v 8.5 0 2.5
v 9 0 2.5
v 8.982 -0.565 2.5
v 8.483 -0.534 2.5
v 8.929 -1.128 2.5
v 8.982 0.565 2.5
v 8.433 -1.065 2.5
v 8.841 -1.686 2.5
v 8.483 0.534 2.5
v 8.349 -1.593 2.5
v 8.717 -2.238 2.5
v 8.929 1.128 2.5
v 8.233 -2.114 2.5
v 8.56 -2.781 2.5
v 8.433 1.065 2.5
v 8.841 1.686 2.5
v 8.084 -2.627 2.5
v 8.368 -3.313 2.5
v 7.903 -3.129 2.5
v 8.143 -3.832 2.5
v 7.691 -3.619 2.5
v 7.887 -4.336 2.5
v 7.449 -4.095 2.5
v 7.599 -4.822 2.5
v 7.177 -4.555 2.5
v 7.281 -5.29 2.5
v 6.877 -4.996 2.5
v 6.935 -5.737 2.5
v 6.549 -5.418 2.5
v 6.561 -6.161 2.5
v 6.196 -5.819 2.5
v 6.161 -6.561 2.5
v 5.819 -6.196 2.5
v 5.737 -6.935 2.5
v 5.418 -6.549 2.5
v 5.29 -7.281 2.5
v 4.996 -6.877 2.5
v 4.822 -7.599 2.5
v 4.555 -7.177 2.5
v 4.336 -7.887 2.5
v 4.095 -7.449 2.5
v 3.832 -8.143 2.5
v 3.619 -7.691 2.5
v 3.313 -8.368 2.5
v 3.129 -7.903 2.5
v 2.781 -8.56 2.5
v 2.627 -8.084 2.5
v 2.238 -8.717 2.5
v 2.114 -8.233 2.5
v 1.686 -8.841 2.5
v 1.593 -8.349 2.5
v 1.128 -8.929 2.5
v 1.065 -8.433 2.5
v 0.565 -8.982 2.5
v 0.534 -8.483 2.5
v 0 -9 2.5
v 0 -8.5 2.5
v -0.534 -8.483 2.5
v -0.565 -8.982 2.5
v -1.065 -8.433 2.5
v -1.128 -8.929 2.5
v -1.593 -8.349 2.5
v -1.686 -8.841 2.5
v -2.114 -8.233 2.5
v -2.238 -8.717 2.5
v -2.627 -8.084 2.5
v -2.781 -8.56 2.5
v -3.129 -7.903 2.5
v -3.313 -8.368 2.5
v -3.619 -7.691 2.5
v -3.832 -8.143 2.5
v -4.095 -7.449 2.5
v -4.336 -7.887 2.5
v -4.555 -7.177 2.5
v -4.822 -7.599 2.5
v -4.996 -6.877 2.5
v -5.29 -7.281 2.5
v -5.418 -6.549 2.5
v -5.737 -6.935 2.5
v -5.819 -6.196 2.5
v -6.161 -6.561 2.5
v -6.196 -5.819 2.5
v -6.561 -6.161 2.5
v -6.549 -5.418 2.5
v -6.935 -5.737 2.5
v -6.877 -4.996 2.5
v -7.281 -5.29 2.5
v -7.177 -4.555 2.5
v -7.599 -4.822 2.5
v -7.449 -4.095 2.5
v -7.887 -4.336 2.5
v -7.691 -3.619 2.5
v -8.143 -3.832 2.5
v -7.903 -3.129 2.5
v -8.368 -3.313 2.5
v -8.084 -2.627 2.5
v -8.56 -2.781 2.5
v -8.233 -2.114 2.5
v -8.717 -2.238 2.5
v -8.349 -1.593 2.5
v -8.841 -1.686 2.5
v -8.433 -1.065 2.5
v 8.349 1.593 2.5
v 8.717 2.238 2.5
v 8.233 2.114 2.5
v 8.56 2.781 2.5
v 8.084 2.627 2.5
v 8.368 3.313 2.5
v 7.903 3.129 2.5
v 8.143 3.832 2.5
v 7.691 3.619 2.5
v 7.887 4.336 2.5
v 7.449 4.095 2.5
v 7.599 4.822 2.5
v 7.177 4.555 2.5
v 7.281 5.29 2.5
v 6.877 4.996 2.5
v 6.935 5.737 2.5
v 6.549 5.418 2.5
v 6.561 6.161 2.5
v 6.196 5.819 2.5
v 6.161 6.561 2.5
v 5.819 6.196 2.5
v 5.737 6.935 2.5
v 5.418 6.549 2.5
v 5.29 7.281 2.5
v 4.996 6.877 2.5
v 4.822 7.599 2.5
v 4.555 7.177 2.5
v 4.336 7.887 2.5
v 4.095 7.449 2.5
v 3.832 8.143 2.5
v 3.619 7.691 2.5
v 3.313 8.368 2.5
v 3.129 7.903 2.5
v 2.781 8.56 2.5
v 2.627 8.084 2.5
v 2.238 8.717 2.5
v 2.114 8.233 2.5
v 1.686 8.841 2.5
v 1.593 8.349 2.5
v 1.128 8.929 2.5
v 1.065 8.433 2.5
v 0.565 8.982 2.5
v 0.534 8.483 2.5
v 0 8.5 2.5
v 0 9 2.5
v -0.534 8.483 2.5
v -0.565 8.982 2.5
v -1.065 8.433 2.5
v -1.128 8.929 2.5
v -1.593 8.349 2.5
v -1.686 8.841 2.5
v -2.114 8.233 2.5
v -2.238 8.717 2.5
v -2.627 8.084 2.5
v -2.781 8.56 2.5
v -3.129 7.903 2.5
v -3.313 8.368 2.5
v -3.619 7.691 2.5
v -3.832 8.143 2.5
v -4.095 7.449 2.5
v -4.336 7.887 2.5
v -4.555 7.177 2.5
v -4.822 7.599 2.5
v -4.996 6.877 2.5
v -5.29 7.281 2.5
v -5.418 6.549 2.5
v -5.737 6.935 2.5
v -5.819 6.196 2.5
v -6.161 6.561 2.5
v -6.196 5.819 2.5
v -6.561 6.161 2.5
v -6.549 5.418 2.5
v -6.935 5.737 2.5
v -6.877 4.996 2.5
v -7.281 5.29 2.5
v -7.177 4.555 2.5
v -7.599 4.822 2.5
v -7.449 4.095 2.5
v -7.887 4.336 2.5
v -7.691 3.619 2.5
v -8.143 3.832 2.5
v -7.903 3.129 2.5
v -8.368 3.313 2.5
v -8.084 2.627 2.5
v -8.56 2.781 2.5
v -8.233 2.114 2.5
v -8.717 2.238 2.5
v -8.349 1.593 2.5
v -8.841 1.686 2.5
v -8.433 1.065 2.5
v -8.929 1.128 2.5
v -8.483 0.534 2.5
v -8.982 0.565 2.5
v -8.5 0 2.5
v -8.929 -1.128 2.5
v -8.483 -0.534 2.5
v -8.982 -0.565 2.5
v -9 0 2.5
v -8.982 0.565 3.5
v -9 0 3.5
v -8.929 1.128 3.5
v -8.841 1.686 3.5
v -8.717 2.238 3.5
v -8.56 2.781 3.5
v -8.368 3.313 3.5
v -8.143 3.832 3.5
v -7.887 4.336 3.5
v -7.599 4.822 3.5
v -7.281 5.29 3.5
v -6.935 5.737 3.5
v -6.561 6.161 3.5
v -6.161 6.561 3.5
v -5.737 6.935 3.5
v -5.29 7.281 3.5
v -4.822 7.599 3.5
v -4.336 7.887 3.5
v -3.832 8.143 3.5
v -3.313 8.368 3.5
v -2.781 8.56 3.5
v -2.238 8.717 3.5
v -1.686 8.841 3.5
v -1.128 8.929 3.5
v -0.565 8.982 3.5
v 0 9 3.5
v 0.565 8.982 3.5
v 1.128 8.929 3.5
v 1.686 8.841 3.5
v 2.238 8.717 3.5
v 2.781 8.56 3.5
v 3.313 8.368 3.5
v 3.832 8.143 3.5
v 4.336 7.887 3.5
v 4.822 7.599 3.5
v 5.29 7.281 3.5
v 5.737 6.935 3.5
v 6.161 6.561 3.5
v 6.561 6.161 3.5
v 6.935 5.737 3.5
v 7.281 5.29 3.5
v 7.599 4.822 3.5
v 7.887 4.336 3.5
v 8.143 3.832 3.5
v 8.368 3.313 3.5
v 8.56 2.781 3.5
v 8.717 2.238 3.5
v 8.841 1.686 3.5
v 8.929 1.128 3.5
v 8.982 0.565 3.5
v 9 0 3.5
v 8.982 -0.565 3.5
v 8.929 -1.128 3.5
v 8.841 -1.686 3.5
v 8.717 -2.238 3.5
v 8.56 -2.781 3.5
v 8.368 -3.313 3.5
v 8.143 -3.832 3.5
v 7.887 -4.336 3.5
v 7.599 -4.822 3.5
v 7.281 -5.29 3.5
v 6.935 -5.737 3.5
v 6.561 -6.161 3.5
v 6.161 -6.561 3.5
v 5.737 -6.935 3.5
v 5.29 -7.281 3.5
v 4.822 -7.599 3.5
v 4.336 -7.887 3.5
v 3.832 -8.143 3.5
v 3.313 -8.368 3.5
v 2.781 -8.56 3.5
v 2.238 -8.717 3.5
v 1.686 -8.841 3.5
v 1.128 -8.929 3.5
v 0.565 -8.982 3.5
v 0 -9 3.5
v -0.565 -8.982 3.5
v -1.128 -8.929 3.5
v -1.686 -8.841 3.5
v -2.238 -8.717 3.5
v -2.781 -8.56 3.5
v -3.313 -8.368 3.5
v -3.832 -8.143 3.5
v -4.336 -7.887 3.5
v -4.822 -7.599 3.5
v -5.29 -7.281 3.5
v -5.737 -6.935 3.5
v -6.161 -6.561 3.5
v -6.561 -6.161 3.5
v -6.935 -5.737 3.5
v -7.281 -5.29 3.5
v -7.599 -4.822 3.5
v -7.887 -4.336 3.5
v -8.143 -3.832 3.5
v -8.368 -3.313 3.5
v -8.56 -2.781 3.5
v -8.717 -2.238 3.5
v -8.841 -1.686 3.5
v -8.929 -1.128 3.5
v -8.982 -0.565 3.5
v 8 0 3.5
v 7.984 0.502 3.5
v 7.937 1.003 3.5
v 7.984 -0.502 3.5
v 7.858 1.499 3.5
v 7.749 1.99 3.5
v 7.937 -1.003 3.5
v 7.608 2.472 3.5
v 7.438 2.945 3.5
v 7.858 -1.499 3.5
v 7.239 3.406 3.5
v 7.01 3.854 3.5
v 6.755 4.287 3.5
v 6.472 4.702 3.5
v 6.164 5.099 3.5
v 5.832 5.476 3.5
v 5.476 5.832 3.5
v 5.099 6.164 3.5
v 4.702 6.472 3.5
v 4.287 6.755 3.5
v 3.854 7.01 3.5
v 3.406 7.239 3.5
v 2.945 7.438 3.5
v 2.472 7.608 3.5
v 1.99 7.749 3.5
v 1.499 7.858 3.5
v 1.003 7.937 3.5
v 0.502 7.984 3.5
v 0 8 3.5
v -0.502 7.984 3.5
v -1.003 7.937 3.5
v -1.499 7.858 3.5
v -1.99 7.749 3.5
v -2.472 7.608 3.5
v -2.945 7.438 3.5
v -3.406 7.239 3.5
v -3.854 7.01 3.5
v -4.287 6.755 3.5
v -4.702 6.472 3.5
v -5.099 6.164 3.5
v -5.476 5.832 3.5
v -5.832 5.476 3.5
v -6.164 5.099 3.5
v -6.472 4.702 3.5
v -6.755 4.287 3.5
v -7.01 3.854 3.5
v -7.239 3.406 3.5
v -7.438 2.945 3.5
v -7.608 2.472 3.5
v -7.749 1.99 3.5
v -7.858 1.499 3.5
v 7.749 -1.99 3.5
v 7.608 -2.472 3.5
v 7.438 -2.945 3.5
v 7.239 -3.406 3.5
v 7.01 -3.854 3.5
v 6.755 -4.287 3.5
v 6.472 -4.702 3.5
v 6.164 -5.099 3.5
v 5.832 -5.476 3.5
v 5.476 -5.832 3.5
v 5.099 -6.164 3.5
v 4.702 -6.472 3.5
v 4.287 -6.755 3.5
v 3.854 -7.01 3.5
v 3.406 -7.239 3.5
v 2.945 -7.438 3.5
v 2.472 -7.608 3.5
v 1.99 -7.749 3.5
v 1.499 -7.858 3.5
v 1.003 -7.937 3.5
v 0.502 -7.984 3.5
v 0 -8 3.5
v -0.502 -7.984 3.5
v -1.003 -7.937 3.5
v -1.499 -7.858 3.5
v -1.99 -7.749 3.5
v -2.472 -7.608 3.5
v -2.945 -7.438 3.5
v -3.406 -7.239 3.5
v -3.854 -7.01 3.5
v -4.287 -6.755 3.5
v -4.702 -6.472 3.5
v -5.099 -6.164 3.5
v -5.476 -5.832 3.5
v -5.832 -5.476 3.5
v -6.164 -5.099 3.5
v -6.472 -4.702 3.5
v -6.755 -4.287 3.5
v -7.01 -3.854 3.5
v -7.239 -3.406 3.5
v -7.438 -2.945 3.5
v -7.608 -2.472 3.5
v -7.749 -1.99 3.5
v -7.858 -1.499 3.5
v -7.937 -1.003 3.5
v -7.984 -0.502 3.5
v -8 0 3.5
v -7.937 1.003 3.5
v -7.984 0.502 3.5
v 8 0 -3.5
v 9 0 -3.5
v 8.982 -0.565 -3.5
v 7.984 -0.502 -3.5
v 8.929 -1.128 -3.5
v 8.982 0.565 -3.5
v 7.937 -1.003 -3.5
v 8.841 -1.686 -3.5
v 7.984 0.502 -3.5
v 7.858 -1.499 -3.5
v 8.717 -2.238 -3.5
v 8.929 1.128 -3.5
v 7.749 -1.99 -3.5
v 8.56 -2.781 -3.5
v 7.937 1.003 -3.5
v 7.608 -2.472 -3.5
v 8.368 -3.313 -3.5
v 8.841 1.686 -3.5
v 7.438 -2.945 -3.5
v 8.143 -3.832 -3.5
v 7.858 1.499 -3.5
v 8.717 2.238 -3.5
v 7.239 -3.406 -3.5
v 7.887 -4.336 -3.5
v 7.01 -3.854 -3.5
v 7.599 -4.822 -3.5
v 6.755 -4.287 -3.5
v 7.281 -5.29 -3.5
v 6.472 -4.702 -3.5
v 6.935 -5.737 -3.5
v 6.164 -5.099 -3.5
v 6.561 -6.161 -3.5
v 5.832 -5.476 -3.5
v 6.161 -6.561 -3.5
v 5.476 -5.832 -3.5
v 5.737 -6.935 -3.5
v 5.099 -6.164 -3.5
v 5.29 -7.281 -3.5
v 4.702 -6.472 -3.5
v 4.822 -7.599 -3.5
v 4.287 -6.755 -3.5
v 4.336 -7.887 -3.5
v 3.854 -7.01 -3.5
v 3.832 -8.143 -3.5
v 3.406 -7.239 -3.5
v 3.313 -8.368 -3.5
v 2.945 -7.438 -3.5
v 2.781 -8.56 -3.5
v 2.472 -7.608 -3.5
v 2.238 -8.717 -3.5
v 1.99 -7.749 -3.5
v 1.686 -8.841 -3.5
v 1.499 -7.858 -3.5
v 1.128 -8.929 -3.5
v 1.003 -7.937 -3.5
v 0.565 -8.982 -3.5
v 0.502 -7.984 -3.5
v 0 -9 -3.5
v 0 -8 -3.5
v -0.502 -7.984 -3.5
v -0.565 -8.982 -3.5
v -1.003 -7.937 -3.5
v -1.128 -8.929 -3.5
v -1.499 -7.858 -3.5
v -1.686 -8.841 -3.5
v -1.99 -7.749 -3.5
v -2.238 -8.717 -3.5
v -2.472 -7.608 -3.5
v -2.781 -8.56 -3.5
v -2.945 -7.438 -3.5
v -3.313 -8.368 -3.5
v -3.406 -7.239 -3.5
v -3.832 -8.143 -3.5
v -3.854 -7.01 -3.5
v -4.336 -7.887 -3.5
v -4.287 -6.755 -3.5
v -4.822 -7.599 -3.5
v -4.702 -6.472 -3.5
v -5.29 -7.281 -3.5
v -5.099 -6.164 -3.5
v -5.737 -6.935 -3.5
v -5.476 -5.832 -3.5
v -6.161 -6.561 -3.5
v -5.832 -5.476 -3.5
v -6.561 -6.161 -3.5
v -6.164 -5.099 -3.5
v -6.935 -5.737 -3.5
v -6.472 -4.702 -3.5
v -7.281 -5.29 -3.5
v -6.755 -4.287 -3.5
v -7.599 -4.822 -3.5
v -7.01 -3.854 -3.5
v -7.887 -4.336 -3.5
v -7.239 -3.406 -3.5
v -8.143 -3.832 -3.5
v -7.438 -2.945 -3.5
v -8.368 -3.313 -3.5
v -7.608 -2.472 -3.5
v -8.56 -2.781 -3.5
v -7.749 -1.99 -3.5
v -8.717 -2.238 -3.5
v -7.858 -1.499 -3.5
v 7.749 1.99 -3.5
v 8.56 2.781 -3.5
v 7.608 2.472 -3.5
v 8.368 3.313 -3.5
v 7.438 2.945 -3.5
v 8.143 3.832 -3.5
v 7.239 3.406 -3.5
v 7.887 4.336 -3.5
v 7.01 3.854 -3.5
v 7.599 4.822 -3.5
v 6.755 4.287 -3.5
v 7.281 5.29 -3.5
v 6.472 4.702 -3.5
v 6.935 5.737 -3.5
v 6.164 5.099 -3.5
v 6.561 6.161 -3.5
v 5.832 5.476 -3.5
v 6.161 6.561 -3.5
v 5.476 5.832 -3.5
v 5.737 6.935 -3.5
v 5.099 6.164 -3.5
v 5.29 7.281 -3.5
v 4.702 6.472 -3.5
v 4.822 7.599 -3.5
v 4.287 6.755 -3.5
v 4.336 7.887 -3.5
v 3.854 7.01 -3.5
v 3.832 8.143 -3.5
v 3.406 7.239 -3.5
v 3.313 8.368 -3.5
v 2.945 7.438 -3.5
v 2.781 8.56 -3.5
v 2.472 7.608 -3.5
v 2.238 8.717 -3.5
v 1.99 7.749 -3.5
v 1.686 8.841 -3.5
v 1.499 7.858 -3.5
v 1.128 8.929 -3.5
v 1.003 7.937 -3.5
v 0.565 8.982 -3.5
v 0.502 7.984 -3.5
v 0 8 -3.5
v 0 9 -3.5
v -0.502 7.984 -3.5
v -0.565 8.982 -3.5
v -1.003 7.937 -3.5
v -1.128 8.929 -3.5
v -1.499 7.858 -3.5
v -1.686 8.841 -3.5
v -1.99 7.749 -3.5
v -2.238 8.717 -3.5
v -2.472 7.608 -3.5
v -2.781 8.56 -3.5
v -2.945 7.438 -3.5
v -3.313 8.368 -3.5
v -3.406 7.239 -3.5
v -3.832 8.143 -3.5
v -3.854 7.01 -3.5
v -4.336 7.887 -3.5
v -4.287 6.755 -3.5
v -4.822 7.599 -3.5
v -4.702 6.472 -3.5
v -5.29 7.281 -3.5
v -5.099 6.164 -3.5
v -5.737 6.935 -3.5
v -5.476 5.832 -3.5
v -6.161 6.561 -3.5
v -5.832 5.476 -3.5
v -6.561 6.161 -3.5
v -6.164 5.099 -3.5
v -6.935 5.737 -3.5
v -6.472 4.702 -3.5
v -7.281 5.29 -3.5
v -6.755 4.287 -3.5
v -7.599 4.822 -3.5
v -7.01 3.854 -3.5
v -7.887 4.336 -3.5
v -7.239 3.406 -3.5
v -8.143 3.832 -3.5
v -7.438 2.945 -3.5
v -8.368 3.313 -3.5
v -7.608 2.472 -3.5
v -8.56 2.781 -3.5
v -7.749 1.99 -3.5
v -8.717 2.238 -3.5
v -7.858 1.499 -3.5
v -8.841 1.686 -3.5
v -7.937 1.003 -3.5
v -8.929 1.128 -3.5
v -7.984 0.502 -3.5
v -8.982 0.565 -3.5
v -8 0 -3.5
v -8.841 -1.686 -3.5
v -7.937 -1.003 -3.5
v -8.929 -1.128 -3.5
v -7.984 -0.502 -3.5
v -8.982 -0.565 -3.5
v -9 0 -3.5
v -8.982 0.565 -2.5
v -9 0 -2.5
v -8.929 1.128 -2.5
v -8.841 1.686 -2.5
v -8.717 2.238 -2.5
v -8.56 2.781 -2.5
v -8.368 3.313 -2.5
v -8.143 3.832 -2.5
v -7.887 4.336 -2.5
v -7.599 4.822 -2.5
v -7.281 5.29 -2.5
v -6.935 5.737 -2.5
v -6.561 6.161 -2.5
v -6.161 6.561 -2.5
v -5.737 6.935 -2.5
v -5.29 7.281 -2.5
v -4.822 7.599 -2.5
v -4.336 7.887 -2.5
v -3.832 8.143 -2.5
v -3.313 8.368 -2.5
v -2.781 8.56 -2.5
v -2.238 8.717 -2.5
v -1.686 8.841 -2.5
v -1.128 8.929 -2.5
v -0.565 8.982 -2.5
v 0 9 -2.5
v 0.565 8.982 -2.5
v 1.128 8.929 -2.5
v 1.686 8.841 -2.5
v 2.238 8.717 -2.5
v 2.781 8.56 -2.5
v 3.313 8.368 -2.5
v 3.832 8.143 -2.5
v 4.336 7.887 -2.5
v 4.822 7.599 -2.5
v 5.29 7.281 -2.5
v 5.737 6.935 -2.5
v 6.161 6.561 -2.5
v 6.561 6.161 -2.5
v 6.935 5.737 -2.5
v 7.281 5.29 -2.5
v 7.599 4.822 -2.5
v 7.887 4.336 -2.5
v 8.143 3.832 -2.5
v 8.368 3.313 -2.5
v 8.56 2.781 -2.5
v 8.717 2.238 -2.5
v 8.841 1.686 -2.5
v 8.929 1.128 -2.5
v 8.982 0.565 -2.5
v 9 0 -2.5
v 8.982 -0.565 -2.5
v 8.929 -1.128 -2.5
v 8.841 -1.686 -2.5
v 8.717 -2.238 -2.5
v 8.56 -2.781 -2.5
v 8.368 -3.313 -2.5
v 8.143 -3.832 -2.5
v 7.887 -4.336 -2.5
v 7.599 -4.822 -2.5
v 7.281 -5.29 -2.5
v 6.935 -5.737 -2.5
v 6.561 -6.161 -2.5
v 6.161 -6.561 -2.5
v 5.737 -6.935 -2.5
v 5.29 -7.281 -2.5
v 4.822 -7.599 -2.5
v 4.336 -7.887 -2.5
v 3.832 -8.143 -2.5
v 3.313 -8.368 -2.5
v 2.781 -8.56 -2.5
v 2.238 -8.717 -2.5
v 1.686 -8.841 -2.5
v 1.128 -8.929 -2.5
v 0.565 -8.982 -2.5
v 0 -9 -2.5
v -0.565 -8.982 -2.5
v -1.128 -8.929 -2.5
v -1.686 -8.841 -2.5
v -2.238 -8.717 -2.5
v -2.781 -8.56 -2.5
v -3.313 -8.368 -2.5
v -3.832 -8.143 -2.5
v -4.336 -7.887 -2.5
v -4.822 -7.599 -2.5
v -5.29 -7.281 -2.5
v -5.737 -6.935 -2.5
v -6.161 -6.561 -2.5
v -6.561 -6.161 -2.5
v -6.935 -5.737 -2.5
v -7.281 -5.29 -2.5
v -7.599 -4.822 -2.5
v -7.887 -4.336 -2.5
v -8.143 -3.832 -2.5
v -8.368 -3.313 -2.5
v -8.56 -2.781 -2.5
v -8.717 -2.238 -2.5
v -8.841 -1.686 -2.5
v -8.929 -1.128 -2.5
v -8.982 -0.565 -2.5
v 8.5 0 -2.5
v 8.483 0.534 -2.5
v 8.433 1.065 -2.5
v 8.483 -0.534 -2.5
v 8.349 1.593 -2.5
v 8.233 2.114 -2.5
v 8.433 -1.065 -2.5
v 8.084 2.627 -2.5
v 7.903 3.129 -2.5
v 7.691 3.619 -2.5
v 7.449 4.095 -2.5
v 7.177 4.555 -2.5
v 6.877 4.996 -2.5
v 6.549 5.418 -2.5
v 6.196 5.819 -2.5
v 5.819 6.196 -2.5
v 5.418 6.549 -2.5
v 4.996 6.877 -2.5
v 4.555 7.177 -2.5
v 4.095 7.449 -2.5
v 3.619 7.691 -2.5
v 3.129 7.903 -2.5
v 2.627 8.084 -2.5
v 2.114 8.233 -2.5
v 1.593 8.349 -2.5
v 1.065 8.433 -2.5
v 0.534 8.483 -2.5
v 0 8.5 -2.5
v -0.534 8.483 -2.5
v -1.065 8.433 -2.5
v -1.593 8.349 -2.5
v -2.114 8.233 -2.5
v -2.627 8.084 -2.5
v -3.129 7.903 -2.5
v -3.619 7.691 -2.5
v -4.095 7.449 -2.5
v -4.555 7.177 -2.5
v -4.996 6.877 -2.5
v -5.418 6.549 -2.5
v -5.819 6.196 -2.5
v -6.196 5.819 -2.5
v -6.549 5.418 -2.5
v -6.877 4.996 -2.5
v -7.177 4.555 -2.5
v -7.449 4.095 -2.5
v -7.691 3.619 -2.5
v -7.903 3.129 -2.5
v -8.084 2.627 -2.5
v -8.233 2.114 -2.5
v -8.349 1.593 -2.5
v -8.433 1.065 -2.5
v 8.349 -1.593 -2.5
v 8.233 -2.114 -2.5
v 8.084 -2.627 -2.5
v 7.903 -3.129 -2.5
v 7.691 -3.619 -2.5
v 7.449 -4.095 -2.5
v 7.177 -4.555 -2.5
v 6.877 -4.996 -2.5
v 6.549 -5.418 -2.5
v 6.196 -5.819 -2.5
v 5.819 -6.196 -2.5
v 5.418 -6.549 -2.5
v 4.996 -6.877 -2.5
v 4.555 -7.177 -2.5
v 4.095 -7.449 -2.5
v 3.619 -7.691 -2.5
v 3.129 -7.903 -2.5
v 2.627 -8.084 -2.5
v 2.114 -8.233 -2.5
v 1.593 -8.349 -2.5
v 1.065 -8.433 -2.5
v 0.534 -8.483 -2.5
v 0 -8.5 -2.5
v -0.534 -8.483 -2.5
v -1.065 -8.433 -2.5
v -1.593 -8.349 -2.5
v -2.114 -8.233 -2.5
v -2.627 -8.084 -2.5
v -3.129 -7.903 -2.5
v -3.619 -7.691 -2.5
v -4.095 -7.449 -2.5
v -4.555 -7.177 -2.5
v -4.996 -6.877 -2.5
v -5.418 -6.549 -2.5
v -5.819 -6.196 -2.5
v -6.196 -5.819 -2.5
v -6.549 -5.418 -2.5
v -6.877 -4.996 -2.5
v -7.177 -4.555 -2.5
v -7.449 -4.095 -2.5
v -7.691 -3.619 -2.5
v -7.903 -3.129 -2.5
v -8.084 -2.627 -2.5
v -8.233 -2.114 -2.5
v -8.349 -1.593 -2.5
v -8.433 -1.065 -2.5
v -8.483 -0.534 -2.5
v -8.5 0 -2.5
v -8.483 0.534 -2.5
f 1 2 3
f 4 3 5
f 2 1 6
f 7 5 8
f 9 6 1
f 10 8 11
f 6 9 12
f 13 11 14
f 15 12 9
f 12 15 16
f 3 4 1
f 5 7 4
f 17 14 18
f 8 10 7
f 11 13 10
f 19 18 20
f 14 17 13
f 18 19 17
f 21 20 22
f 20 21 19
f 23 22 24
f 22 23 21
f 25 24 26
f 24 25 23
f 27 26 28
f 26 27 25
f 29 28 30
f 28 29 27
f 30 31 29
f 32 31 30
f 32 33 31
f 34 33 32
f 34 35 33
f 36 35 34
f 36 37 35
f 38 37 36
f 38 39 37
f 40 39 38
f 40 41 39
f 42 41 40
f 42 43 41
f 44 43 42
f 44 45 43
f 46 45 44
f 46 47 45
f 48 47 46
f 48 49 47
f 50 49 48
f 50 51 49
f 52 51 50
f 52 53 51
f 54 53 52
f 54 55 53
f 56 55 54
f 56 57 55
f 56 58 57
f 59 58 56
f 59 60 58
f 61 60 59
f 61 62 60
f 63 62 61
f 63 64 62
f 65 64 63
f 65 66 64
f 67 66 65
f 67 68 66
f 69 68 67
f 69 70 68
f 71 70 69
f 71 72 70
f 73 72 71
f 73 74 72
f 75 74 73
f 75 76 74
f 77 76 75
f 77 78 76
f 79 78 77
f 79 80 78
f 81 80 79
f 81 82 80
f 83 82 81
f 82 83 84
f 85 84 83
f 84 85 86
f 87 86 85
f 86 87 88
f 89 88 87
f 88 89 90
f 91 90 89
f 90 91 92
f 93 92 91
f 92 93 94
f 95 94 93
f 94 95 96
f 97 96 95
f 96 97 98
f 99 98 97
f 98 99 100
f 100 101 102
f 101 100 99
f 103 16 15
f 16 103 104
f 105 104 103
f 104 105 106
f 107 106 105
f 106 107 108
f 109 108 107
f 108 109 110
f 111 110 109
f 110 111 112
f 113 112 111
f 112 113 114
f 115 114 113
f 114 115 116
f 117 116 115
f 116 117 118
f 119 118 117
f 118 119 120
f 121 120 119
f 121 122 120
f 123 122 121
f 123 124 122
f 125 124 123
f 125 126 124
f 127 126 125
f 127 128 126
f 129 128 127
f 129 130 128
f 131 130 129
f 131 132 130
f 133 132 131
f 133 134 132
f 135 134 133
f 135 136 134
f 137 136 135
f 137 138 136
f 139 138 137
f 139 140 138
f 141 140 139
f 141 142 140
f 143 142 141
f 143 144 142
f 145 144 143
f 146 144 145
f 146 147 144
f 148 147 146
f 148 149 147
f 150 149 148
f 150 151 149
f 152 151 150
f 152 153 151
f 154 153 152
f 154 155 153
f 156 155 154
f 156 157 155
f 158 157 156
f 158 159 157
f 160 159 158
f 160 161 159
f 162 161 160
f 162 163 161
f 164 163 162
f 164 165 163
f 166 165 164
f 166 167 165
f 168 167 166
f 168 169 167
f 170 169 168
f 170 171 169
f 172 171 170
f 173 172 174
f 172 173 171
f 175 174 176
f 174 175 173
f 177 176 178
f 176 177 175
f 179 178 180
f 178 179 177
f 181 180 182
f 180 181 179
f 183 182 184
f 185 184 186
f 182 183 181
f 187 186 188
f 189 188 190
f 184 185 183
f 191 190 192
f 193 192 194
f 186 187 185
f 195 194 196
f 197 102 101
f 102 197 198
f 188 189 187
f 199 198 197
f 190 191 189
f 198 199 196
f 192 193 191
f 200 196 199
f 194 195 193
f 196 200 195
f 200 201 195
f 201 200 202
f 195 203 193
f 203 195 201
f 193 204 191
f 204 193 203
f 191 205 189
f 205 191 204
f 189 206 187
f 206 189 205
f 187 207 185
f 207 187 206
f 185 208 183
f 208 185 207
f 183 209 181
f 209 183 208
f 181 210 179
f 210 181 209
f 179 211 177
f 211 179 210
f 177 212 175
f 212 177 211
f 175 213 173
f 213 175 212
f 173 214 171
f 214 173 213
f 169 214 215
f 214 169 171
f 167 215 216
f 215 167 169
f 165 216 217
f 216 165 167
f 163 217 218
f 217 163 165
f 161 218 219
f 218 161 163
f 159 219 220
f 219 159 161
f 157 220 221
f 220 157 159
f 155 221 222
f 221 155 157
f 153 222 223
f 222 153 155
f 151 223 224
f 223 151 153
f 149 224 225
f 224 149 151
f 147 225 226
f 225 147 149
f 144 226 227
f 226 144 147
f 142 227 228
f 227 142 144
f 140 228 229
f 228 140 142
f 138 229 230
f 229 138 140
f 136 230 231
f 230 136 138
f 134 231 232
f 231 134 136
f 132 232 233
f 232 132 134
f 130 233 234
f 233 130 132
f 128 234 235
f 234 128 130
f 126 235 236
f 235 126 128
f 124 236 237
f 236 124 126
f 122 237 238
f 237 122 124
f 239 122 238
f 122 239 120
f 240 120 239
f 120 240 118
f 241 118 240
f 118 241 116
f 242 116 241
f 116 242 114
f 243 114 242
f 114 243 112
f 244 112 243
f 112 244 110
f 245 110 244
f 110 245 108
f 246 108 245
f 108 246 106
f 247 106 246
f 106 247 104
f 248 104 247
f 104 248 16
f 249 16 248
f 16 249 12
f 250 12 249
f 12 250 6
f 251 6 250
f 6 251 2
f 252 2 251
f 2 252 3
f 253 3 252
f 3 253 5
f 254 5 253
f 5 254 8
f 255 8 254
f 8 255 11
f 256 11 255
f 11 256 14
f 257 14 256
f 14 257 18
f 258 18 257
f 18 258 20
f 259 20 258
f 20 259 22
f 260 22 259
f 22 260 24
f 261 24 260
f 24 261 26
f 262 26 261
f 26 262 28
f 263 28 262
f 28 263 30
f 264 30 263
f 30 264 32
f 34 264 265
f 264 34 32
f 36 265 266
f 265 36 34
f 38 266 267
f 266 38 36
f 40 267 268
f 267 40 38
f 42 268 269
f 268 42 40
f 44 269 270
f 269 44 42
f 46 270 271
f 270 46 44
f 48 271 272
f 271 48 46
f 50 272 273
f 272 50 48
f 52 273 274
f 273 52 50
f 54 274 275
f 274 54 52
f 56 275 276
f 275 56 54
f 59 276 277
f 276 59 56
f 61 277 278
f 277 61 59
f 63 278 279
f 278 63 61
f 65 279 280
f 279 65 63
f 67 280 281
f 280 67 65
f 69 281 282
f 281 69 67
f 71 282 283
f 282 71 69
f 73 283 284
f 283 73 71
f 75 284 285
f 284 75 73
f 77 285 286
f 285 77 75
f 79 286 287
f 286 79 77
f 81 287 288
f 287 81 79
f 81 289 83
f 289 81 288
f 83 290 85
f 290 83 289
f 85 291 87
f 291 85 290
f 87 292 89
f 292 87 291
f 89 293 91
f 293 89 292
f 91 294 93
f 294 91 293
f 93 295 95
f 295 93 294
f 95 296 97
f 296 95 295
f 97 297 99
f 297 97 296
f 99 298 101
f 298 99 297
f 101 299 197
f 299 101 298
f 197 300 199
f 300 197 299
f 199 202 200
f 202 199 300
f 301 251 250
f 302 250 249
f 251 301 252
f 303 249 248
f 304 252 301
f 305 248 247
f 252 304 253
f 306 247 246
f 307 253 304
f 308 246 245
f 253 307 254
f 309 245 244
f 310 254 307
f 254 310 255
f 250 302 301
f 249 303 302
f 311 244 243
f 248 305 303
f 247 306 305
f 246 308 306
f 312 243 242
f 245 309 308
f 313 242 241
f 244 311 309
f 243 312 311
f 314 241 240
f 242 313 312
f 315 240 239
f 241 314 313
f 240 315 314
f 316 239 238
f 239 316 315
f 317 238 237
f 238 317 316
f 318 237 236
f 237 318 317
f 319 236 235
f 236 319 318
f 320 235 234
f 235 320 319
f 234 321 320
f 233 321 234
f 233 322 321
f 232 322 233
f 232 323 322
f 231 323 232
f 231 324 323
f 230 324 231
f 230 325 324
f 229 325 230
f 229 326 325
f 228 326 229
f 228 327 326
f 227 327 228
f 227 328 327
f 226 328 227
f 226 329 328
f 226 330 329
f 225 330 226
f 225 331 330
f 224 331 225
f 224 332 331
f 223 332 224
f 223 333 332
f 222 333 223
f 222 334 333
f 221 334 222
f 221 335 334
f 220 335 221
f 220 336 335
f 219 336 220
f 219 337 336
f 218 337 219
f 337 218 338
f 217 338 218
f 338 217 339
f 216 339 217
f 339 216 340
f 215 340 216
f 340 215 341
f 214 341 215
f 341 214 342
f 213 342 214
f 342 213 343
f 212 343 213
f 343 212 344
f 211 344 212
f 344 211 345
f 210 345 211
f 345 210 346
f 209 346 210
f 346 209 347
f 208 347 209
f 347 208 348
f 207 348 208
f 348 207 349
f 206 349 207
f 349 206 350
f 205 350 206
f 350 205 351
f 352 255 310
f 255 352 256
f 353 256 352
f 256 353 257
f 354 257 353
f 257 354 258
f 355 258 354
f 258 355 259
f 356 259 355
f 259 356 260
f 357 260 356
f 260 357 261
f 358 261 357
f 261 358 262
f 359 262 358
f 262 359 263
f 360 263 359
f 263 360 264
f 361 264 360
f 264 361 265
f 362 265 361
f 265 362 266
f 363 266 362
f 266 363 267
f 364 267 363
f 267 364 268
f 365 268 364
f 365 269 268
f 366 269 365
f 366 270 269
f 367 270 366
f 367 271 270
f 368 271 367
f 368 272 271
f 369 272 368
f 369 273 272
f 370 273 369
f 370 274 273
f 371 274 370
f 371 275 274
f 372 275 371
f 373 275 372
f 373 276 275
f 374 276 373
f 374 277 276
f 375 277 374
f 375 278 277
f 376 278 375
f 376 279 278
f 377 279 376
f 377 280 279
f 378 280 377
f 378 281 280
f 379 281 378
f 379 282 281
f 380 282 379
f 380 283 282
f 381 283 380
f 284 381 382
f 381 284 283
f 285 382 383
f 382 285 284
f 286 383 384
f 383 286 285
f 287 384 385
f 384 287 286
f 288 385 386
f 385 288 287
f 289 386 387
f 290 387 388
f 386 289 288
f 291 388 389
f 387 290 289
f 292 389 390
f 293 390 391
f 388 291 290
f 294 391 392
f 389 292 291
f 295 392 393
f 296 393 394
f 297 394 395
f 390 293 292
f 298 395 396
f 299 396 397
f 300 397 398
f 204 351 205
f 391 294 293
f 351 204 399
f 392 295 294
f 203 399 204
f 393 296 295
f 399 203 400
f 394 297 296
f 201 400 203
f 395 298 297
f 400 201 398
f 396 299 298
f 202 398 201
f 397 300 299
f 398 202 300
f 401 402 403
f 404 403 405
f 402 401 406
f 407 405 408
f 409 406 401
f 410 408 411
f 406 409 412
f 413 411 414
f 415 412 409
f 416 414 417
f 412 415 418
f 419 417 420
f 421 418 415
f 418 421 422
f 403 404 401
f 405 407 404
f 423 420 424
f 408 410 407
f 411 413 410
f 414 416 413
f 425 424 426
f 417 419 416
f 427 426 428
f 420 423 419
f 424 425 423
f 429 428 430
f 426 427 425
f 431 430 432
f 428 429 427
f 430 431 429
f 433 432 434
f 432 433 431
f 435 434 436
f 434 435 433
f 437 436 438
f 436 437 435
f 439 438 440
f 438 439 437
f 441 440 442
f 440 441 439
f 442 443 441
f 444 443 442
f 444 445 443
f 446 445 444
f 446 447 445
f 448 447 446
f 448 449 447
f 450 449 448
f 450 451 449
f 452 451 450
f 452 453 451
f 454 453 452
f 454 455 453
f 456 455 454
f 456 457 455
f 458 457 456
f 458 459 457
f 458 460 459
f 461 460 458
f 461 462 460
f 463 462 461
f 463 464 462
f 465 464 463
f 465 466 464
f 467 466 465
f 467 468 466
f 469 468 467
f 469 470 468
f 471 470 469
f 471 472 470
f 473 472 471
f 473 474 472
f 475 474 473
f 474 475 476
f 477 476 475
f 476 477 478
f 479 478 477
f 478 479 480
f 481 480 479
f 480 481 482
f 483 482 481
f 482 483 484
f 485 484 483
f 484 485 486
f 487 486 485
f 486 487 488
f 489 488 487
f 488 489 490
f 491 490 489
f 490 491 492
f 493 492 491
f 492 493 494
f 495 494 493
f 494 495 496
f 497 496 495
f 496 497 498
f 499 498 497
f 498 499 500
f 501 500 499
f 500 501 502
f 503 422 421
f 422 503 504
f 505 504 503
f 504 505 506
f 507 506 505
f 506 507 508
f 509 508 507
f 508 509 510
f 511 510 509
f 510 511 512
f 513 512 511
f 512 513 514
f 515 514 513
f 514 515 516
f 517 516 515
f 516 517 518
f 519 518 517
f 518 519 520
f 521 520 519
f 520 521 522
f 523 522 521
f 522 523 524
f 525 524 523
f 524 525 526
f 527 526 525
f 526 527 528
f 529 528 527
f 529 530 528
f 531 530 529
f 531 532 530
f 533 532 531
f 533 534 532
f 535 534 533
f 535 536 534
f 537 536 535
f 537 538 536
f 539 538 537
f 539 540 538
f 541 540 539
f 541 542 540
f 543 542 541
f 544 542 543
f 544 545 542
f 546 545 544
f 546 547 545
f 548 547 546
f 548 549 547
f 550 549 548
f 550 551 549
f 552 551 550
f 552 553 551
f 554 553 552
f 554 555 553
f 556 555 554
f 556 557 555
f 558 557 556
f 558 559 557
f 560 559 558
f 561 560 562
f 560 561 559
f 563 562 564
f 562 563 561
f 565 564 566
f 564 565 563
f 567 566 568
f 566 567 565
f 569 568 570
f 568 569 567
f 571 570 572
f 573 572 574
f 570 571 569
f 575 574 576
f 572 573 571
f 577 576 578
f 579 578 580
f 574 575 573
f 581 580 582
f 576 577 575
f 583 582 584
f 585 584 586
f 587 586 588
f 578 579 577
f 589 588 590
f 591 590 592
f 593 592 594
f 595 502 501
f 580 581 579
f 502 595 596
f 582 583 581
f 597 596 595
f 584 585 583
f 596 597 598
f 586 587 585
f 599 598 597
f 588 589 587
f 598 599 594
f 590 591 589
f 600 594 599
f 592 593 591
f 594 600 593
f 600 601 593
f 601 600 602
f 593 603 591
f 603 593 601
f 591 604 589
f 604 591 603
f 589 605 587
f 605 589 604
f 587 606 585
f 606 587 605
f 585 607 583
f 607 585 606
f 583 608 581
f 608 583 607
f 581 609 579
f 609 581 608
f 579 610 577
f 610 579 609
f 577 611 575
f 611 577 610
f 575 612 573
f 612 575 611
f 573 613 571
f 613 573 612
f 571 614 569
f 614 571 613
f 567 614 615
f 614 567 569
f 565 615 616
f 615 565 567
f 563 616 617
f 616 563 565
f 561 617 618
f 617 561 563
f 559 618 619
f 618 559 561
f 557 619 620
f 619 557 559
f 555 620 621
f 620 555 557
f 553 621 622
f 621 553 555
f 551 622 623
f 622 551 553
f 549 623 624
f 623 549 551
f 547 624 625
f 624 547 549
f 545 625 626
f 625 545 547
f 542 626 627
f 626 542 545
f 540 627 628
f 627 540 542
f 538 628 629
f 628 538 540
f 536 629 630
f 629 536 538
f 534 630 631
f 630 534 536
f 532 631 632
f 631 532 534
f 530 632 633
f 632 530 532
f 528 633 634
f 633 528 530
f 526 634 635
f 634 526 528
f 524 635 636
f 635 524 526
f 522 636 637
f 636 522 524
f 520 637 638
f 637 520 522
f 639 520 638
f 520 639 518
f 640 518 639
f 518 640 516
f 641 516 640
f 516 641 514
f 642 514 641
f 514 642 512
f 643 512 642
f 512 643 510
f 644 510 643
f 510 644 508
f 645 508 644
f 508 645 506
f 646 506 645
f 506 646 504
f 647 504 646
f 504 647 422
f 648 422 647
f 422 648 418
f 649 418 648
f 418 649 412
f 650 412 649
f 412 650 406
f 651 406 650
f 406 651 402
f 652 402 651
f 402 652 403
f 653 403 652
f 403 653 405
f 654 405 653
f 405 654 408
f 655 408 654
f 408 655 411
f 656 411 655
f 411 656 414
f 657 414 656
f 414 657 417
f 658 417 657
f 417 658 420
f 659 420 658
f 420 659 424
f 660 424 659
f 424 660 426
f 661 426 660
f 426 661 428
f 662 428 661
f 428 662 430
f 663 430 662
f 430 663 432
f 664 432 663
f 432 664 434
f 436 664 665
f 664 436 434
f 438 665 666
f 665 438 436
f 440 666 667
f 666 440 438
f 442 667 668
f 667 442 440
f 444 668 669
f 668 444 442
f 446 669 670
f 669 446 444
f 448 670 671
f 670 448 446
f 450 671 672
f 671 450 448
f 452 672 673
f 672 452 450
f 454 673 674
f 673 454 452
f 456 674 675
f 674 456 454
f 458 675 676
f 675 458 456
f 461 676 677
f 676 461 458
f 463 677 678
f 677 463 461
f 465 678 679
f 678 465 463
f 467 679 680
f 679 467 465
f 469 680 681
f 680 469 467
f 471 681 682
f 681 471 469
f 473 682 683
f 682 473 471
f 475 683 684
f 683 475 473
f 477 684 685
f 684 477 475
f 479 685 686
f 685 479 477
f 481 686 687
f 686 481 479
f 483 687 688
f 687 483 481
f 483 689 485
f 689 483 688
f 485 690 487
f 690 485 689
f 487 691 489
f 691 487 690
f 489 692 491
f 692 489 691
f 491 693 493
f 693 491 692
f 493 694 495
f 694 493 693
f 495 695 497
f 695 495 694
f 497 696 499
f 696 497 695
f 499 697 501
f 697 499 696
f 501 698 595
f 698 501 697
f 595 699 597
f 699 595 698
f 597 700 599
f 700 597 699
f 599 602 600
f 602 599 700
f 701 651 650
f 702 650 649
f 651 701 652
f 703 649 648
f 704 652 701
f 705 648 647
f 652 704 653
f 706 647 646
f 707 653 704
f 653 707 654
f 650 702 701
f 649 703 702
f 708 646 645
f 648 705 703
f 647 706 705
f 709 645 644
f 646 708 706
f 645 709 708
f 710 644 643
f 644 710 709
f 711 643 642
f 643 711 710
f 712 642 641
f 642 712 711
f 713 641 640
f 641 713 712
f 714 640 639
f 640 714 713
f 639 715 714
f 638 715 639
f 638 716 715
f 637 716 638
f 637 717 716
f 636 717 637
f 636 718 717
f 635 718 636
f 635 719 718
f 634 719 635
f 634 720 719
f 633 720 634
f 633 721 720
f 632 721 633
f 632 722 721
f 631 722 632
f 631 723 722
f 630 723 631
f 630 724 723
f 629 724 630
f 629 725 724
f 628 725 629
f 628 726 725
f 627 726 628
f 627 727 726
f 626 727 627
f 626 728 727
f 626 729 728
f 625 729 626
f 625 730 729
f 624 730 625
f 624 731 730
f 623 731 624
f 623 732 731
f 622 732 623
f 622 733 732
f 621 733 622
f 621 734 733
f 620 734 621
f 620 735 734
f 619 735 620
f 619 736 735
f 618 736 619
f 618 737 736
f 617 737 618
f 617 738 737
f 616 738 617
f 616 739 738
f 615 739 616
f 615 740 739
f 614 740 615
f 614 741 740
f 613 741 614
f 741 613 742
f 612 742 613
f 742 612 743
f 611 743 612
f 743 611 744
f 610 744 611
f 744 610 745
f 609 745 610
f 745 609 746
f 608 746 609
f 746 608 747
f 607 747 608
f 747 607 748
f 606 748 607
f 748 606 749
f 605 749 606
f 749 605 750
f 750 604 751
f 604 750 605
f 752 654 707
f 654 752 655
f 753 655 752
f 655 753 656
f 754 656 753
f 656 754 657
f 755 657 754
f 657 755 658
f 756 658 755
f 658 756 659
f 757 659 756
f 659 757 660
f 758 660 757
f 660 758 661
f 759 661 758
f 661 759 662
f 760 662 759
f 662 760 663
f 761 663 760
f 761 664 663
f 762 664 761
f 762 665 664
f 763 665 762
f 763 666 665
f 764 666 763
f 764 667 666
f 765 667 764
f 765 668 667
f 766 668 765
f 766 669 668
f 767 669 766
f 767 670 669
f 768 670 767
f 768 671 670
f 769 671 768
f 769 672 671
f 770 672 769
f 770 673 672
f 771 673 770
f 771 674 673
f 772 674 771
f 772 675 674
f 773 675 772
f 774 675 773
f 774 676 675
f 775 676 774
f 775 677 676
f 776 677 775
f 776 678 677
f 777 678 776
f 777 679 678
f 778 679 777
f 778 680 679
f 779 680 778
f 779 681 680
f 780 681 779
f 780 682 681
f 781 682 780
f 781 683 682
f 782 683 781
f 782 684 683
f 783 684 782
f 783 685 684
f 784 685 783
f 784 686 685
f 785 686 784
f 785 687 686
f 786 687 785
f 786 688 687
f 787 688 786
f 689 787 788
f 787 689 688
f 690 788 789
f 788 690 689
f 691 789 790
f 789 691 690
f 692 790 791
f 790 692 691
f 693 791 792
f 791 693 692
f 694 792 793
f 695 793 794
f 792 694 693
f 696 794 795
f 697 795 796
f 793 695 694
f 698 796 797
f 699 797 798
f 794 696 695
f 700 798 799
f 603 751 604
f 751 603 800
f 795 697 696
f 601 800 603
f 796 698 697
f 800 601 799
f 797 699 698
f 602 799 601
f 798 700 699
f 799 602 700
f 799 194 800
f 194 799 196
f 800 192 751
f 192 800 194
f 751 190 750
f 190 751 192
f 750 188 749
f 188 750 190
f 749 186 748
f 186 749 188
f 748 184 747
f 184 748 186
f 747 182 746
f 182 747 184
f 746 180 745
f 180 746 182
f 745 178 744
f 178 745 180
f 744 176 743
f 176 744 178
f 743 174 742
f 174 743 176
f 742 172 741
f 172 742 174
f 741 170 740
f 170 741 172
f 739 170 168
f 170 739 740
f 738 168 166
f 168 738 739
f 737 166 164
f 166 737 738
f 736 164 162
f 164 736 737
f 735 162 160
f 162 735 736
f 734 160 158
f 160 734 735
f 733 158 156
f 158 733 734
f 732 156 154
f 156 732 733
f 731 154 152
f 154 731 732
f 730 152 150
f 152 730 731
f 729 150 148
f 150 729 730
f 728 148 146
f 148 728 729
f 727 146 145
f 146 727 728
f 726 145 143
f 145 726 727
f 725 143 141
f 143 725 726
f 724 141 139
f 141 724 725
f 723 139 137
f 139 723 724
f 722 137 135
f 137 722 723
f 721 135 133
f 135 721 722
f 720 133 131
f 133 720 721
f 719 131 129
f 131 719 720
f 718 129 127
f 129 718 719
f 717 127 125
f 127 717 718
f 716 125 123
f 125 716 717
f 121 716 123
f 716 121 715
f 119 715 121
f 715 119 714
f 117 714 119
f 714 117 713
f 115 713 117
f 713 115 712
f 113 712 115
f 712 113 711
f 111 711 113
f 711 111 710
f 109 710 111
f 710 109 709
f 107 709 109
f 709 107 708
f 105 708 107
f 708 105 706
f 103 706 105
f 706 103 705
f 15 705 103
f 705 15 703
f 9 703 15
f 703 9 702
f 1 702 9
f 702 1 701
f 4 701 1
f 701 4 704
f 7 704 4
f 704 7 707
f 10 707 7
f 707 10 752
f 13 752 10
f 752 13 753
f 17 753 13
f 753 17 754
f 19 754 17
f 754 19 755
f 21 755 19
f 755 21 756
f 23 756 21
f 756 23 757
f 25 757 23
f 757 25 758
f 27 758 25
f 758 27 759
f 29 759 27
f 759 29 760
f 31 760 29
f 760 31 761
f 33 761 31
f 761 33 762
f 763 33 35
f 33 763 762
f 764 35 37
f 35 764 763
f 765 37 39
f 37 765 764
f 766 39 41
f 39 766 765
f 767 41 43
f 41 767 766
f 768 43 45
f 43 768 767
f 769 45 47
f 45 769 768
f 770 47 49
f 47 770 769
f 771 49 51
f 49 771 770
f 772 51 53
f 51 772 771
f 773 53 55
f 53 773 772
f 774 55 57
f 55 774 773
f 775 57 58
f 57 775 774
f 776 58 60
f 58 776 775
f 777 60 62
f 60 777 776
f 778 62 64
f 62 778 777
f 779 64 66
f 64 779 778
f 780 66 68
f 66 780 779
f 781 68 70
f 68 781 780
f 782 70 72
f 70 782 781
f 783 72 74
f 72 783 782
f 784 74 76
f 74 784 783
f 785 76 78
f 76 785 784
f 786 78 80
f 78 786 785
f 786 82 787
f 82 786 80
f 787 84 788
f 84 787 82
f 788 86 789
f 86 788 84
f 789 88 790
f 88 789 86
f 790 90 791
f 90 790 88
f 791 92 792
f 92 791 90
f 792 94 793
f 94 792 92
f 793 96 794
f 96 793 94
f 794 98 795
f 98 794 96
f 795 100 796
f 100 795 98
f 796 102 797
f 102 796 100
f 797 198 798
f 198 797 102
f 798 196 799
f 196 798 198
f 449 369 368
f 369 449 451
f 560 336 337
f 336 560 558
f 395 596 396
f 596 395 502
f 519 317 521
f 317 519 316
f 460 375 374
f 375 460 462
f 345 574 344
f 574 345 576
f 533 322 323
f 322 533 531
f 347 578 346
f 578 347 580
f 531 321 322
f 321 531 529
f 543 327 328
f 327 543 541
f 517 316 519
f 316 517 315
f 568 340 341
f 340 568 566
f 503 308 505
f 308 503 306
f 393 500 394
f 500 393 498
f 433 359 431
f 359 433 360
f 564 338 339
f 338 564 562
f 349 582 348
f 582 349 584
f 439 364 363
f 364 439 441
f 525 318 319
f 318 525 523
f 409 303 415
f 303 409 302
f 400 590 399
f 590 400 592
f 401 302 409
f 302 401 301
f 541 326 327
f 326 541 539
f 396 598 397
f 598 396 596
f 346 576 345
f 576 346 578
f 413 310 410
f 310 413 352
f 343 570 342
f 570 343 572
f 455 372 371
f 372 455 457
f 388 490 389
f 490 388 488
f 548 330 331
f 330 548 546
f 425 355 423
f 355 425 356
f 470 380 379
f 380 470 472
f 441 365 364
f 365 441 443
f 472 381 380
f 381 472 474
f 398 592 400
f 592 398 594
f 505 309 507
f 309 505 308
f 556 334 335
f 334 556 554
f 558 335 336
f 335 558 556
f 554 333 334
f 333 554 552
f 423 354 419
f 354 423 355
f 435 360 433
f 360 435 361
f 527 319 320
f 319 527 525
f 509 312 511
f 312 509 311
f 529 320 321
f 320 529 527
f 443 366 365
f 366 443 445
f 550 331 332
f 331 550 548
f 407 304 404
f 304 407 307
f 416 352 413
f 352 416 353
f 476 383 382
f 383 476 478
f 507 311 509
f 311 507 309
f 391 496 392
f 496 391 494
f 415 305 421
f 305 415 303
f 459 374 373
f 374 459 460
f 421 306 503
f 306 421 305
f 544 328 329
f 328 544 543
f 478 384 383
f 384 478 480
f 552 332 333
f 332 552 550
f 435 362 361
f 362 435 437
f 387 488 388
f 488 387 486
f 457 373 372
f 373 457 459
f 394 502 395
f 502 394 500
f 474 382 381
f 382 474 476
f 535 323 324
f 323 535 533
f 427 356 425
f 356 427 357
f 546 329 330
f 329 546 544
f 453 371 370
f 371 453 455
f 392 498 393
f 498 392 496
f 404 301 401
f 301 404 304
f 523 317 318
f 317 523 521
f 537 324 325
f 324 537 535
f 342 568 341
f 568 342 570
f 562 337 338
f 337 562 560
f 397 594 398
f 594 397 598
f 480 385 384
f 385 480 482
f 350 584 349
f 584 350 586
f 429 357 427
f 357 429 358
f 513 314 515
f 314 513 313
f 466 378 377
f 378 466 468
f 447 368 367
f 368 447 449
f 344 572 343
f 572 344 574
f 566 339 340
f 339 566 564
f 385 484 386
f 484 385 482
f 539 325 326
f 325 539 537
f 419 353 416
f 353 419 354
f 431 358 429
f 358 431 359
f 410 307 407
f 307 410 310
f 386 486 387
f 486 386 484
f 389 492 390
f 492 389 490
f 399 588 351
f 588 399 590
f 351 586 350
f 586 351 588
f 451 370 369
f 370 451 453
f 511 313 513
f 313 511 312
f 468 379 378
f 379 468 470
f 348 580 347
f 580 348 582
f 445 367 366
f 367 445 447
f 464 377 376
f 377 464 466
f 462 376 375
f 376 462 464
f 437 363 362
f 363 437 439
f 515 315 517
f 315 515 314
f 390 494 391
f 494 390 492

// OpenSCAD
// Author: Samuel El-Borai <samuel.elborai@gmail.com>
// Date: 05/04/2014
//
// Flat ring with sinusoidal decoration

difference() {
    union() {
        for(tetha = [0:.5:360]){
            rotate([1, 0, tetha]){
                translate([8.7, 0, 2 * sin(10 * tetha)])
                rotate([90, 0, 0]) {
                    circle(0.5, $fn = 100);
                }
            }
        }

        rotate_extrude(convexity = 10, $fn = 100)
        translate([5, 3, 0])
        square([8, 1], true);

        rotate_extrude(convexity = 10, $fn = 100)
        translate([5, -3, 0])
        square([8, 1], true);

        rotate_extrude(convexity = 10, $fn = 100)
        translate([5, 0, 0])
        square([7, 6], true);
    }

    cylinder(h = 10, r = 8, center = true,  $fn = 100);
}
